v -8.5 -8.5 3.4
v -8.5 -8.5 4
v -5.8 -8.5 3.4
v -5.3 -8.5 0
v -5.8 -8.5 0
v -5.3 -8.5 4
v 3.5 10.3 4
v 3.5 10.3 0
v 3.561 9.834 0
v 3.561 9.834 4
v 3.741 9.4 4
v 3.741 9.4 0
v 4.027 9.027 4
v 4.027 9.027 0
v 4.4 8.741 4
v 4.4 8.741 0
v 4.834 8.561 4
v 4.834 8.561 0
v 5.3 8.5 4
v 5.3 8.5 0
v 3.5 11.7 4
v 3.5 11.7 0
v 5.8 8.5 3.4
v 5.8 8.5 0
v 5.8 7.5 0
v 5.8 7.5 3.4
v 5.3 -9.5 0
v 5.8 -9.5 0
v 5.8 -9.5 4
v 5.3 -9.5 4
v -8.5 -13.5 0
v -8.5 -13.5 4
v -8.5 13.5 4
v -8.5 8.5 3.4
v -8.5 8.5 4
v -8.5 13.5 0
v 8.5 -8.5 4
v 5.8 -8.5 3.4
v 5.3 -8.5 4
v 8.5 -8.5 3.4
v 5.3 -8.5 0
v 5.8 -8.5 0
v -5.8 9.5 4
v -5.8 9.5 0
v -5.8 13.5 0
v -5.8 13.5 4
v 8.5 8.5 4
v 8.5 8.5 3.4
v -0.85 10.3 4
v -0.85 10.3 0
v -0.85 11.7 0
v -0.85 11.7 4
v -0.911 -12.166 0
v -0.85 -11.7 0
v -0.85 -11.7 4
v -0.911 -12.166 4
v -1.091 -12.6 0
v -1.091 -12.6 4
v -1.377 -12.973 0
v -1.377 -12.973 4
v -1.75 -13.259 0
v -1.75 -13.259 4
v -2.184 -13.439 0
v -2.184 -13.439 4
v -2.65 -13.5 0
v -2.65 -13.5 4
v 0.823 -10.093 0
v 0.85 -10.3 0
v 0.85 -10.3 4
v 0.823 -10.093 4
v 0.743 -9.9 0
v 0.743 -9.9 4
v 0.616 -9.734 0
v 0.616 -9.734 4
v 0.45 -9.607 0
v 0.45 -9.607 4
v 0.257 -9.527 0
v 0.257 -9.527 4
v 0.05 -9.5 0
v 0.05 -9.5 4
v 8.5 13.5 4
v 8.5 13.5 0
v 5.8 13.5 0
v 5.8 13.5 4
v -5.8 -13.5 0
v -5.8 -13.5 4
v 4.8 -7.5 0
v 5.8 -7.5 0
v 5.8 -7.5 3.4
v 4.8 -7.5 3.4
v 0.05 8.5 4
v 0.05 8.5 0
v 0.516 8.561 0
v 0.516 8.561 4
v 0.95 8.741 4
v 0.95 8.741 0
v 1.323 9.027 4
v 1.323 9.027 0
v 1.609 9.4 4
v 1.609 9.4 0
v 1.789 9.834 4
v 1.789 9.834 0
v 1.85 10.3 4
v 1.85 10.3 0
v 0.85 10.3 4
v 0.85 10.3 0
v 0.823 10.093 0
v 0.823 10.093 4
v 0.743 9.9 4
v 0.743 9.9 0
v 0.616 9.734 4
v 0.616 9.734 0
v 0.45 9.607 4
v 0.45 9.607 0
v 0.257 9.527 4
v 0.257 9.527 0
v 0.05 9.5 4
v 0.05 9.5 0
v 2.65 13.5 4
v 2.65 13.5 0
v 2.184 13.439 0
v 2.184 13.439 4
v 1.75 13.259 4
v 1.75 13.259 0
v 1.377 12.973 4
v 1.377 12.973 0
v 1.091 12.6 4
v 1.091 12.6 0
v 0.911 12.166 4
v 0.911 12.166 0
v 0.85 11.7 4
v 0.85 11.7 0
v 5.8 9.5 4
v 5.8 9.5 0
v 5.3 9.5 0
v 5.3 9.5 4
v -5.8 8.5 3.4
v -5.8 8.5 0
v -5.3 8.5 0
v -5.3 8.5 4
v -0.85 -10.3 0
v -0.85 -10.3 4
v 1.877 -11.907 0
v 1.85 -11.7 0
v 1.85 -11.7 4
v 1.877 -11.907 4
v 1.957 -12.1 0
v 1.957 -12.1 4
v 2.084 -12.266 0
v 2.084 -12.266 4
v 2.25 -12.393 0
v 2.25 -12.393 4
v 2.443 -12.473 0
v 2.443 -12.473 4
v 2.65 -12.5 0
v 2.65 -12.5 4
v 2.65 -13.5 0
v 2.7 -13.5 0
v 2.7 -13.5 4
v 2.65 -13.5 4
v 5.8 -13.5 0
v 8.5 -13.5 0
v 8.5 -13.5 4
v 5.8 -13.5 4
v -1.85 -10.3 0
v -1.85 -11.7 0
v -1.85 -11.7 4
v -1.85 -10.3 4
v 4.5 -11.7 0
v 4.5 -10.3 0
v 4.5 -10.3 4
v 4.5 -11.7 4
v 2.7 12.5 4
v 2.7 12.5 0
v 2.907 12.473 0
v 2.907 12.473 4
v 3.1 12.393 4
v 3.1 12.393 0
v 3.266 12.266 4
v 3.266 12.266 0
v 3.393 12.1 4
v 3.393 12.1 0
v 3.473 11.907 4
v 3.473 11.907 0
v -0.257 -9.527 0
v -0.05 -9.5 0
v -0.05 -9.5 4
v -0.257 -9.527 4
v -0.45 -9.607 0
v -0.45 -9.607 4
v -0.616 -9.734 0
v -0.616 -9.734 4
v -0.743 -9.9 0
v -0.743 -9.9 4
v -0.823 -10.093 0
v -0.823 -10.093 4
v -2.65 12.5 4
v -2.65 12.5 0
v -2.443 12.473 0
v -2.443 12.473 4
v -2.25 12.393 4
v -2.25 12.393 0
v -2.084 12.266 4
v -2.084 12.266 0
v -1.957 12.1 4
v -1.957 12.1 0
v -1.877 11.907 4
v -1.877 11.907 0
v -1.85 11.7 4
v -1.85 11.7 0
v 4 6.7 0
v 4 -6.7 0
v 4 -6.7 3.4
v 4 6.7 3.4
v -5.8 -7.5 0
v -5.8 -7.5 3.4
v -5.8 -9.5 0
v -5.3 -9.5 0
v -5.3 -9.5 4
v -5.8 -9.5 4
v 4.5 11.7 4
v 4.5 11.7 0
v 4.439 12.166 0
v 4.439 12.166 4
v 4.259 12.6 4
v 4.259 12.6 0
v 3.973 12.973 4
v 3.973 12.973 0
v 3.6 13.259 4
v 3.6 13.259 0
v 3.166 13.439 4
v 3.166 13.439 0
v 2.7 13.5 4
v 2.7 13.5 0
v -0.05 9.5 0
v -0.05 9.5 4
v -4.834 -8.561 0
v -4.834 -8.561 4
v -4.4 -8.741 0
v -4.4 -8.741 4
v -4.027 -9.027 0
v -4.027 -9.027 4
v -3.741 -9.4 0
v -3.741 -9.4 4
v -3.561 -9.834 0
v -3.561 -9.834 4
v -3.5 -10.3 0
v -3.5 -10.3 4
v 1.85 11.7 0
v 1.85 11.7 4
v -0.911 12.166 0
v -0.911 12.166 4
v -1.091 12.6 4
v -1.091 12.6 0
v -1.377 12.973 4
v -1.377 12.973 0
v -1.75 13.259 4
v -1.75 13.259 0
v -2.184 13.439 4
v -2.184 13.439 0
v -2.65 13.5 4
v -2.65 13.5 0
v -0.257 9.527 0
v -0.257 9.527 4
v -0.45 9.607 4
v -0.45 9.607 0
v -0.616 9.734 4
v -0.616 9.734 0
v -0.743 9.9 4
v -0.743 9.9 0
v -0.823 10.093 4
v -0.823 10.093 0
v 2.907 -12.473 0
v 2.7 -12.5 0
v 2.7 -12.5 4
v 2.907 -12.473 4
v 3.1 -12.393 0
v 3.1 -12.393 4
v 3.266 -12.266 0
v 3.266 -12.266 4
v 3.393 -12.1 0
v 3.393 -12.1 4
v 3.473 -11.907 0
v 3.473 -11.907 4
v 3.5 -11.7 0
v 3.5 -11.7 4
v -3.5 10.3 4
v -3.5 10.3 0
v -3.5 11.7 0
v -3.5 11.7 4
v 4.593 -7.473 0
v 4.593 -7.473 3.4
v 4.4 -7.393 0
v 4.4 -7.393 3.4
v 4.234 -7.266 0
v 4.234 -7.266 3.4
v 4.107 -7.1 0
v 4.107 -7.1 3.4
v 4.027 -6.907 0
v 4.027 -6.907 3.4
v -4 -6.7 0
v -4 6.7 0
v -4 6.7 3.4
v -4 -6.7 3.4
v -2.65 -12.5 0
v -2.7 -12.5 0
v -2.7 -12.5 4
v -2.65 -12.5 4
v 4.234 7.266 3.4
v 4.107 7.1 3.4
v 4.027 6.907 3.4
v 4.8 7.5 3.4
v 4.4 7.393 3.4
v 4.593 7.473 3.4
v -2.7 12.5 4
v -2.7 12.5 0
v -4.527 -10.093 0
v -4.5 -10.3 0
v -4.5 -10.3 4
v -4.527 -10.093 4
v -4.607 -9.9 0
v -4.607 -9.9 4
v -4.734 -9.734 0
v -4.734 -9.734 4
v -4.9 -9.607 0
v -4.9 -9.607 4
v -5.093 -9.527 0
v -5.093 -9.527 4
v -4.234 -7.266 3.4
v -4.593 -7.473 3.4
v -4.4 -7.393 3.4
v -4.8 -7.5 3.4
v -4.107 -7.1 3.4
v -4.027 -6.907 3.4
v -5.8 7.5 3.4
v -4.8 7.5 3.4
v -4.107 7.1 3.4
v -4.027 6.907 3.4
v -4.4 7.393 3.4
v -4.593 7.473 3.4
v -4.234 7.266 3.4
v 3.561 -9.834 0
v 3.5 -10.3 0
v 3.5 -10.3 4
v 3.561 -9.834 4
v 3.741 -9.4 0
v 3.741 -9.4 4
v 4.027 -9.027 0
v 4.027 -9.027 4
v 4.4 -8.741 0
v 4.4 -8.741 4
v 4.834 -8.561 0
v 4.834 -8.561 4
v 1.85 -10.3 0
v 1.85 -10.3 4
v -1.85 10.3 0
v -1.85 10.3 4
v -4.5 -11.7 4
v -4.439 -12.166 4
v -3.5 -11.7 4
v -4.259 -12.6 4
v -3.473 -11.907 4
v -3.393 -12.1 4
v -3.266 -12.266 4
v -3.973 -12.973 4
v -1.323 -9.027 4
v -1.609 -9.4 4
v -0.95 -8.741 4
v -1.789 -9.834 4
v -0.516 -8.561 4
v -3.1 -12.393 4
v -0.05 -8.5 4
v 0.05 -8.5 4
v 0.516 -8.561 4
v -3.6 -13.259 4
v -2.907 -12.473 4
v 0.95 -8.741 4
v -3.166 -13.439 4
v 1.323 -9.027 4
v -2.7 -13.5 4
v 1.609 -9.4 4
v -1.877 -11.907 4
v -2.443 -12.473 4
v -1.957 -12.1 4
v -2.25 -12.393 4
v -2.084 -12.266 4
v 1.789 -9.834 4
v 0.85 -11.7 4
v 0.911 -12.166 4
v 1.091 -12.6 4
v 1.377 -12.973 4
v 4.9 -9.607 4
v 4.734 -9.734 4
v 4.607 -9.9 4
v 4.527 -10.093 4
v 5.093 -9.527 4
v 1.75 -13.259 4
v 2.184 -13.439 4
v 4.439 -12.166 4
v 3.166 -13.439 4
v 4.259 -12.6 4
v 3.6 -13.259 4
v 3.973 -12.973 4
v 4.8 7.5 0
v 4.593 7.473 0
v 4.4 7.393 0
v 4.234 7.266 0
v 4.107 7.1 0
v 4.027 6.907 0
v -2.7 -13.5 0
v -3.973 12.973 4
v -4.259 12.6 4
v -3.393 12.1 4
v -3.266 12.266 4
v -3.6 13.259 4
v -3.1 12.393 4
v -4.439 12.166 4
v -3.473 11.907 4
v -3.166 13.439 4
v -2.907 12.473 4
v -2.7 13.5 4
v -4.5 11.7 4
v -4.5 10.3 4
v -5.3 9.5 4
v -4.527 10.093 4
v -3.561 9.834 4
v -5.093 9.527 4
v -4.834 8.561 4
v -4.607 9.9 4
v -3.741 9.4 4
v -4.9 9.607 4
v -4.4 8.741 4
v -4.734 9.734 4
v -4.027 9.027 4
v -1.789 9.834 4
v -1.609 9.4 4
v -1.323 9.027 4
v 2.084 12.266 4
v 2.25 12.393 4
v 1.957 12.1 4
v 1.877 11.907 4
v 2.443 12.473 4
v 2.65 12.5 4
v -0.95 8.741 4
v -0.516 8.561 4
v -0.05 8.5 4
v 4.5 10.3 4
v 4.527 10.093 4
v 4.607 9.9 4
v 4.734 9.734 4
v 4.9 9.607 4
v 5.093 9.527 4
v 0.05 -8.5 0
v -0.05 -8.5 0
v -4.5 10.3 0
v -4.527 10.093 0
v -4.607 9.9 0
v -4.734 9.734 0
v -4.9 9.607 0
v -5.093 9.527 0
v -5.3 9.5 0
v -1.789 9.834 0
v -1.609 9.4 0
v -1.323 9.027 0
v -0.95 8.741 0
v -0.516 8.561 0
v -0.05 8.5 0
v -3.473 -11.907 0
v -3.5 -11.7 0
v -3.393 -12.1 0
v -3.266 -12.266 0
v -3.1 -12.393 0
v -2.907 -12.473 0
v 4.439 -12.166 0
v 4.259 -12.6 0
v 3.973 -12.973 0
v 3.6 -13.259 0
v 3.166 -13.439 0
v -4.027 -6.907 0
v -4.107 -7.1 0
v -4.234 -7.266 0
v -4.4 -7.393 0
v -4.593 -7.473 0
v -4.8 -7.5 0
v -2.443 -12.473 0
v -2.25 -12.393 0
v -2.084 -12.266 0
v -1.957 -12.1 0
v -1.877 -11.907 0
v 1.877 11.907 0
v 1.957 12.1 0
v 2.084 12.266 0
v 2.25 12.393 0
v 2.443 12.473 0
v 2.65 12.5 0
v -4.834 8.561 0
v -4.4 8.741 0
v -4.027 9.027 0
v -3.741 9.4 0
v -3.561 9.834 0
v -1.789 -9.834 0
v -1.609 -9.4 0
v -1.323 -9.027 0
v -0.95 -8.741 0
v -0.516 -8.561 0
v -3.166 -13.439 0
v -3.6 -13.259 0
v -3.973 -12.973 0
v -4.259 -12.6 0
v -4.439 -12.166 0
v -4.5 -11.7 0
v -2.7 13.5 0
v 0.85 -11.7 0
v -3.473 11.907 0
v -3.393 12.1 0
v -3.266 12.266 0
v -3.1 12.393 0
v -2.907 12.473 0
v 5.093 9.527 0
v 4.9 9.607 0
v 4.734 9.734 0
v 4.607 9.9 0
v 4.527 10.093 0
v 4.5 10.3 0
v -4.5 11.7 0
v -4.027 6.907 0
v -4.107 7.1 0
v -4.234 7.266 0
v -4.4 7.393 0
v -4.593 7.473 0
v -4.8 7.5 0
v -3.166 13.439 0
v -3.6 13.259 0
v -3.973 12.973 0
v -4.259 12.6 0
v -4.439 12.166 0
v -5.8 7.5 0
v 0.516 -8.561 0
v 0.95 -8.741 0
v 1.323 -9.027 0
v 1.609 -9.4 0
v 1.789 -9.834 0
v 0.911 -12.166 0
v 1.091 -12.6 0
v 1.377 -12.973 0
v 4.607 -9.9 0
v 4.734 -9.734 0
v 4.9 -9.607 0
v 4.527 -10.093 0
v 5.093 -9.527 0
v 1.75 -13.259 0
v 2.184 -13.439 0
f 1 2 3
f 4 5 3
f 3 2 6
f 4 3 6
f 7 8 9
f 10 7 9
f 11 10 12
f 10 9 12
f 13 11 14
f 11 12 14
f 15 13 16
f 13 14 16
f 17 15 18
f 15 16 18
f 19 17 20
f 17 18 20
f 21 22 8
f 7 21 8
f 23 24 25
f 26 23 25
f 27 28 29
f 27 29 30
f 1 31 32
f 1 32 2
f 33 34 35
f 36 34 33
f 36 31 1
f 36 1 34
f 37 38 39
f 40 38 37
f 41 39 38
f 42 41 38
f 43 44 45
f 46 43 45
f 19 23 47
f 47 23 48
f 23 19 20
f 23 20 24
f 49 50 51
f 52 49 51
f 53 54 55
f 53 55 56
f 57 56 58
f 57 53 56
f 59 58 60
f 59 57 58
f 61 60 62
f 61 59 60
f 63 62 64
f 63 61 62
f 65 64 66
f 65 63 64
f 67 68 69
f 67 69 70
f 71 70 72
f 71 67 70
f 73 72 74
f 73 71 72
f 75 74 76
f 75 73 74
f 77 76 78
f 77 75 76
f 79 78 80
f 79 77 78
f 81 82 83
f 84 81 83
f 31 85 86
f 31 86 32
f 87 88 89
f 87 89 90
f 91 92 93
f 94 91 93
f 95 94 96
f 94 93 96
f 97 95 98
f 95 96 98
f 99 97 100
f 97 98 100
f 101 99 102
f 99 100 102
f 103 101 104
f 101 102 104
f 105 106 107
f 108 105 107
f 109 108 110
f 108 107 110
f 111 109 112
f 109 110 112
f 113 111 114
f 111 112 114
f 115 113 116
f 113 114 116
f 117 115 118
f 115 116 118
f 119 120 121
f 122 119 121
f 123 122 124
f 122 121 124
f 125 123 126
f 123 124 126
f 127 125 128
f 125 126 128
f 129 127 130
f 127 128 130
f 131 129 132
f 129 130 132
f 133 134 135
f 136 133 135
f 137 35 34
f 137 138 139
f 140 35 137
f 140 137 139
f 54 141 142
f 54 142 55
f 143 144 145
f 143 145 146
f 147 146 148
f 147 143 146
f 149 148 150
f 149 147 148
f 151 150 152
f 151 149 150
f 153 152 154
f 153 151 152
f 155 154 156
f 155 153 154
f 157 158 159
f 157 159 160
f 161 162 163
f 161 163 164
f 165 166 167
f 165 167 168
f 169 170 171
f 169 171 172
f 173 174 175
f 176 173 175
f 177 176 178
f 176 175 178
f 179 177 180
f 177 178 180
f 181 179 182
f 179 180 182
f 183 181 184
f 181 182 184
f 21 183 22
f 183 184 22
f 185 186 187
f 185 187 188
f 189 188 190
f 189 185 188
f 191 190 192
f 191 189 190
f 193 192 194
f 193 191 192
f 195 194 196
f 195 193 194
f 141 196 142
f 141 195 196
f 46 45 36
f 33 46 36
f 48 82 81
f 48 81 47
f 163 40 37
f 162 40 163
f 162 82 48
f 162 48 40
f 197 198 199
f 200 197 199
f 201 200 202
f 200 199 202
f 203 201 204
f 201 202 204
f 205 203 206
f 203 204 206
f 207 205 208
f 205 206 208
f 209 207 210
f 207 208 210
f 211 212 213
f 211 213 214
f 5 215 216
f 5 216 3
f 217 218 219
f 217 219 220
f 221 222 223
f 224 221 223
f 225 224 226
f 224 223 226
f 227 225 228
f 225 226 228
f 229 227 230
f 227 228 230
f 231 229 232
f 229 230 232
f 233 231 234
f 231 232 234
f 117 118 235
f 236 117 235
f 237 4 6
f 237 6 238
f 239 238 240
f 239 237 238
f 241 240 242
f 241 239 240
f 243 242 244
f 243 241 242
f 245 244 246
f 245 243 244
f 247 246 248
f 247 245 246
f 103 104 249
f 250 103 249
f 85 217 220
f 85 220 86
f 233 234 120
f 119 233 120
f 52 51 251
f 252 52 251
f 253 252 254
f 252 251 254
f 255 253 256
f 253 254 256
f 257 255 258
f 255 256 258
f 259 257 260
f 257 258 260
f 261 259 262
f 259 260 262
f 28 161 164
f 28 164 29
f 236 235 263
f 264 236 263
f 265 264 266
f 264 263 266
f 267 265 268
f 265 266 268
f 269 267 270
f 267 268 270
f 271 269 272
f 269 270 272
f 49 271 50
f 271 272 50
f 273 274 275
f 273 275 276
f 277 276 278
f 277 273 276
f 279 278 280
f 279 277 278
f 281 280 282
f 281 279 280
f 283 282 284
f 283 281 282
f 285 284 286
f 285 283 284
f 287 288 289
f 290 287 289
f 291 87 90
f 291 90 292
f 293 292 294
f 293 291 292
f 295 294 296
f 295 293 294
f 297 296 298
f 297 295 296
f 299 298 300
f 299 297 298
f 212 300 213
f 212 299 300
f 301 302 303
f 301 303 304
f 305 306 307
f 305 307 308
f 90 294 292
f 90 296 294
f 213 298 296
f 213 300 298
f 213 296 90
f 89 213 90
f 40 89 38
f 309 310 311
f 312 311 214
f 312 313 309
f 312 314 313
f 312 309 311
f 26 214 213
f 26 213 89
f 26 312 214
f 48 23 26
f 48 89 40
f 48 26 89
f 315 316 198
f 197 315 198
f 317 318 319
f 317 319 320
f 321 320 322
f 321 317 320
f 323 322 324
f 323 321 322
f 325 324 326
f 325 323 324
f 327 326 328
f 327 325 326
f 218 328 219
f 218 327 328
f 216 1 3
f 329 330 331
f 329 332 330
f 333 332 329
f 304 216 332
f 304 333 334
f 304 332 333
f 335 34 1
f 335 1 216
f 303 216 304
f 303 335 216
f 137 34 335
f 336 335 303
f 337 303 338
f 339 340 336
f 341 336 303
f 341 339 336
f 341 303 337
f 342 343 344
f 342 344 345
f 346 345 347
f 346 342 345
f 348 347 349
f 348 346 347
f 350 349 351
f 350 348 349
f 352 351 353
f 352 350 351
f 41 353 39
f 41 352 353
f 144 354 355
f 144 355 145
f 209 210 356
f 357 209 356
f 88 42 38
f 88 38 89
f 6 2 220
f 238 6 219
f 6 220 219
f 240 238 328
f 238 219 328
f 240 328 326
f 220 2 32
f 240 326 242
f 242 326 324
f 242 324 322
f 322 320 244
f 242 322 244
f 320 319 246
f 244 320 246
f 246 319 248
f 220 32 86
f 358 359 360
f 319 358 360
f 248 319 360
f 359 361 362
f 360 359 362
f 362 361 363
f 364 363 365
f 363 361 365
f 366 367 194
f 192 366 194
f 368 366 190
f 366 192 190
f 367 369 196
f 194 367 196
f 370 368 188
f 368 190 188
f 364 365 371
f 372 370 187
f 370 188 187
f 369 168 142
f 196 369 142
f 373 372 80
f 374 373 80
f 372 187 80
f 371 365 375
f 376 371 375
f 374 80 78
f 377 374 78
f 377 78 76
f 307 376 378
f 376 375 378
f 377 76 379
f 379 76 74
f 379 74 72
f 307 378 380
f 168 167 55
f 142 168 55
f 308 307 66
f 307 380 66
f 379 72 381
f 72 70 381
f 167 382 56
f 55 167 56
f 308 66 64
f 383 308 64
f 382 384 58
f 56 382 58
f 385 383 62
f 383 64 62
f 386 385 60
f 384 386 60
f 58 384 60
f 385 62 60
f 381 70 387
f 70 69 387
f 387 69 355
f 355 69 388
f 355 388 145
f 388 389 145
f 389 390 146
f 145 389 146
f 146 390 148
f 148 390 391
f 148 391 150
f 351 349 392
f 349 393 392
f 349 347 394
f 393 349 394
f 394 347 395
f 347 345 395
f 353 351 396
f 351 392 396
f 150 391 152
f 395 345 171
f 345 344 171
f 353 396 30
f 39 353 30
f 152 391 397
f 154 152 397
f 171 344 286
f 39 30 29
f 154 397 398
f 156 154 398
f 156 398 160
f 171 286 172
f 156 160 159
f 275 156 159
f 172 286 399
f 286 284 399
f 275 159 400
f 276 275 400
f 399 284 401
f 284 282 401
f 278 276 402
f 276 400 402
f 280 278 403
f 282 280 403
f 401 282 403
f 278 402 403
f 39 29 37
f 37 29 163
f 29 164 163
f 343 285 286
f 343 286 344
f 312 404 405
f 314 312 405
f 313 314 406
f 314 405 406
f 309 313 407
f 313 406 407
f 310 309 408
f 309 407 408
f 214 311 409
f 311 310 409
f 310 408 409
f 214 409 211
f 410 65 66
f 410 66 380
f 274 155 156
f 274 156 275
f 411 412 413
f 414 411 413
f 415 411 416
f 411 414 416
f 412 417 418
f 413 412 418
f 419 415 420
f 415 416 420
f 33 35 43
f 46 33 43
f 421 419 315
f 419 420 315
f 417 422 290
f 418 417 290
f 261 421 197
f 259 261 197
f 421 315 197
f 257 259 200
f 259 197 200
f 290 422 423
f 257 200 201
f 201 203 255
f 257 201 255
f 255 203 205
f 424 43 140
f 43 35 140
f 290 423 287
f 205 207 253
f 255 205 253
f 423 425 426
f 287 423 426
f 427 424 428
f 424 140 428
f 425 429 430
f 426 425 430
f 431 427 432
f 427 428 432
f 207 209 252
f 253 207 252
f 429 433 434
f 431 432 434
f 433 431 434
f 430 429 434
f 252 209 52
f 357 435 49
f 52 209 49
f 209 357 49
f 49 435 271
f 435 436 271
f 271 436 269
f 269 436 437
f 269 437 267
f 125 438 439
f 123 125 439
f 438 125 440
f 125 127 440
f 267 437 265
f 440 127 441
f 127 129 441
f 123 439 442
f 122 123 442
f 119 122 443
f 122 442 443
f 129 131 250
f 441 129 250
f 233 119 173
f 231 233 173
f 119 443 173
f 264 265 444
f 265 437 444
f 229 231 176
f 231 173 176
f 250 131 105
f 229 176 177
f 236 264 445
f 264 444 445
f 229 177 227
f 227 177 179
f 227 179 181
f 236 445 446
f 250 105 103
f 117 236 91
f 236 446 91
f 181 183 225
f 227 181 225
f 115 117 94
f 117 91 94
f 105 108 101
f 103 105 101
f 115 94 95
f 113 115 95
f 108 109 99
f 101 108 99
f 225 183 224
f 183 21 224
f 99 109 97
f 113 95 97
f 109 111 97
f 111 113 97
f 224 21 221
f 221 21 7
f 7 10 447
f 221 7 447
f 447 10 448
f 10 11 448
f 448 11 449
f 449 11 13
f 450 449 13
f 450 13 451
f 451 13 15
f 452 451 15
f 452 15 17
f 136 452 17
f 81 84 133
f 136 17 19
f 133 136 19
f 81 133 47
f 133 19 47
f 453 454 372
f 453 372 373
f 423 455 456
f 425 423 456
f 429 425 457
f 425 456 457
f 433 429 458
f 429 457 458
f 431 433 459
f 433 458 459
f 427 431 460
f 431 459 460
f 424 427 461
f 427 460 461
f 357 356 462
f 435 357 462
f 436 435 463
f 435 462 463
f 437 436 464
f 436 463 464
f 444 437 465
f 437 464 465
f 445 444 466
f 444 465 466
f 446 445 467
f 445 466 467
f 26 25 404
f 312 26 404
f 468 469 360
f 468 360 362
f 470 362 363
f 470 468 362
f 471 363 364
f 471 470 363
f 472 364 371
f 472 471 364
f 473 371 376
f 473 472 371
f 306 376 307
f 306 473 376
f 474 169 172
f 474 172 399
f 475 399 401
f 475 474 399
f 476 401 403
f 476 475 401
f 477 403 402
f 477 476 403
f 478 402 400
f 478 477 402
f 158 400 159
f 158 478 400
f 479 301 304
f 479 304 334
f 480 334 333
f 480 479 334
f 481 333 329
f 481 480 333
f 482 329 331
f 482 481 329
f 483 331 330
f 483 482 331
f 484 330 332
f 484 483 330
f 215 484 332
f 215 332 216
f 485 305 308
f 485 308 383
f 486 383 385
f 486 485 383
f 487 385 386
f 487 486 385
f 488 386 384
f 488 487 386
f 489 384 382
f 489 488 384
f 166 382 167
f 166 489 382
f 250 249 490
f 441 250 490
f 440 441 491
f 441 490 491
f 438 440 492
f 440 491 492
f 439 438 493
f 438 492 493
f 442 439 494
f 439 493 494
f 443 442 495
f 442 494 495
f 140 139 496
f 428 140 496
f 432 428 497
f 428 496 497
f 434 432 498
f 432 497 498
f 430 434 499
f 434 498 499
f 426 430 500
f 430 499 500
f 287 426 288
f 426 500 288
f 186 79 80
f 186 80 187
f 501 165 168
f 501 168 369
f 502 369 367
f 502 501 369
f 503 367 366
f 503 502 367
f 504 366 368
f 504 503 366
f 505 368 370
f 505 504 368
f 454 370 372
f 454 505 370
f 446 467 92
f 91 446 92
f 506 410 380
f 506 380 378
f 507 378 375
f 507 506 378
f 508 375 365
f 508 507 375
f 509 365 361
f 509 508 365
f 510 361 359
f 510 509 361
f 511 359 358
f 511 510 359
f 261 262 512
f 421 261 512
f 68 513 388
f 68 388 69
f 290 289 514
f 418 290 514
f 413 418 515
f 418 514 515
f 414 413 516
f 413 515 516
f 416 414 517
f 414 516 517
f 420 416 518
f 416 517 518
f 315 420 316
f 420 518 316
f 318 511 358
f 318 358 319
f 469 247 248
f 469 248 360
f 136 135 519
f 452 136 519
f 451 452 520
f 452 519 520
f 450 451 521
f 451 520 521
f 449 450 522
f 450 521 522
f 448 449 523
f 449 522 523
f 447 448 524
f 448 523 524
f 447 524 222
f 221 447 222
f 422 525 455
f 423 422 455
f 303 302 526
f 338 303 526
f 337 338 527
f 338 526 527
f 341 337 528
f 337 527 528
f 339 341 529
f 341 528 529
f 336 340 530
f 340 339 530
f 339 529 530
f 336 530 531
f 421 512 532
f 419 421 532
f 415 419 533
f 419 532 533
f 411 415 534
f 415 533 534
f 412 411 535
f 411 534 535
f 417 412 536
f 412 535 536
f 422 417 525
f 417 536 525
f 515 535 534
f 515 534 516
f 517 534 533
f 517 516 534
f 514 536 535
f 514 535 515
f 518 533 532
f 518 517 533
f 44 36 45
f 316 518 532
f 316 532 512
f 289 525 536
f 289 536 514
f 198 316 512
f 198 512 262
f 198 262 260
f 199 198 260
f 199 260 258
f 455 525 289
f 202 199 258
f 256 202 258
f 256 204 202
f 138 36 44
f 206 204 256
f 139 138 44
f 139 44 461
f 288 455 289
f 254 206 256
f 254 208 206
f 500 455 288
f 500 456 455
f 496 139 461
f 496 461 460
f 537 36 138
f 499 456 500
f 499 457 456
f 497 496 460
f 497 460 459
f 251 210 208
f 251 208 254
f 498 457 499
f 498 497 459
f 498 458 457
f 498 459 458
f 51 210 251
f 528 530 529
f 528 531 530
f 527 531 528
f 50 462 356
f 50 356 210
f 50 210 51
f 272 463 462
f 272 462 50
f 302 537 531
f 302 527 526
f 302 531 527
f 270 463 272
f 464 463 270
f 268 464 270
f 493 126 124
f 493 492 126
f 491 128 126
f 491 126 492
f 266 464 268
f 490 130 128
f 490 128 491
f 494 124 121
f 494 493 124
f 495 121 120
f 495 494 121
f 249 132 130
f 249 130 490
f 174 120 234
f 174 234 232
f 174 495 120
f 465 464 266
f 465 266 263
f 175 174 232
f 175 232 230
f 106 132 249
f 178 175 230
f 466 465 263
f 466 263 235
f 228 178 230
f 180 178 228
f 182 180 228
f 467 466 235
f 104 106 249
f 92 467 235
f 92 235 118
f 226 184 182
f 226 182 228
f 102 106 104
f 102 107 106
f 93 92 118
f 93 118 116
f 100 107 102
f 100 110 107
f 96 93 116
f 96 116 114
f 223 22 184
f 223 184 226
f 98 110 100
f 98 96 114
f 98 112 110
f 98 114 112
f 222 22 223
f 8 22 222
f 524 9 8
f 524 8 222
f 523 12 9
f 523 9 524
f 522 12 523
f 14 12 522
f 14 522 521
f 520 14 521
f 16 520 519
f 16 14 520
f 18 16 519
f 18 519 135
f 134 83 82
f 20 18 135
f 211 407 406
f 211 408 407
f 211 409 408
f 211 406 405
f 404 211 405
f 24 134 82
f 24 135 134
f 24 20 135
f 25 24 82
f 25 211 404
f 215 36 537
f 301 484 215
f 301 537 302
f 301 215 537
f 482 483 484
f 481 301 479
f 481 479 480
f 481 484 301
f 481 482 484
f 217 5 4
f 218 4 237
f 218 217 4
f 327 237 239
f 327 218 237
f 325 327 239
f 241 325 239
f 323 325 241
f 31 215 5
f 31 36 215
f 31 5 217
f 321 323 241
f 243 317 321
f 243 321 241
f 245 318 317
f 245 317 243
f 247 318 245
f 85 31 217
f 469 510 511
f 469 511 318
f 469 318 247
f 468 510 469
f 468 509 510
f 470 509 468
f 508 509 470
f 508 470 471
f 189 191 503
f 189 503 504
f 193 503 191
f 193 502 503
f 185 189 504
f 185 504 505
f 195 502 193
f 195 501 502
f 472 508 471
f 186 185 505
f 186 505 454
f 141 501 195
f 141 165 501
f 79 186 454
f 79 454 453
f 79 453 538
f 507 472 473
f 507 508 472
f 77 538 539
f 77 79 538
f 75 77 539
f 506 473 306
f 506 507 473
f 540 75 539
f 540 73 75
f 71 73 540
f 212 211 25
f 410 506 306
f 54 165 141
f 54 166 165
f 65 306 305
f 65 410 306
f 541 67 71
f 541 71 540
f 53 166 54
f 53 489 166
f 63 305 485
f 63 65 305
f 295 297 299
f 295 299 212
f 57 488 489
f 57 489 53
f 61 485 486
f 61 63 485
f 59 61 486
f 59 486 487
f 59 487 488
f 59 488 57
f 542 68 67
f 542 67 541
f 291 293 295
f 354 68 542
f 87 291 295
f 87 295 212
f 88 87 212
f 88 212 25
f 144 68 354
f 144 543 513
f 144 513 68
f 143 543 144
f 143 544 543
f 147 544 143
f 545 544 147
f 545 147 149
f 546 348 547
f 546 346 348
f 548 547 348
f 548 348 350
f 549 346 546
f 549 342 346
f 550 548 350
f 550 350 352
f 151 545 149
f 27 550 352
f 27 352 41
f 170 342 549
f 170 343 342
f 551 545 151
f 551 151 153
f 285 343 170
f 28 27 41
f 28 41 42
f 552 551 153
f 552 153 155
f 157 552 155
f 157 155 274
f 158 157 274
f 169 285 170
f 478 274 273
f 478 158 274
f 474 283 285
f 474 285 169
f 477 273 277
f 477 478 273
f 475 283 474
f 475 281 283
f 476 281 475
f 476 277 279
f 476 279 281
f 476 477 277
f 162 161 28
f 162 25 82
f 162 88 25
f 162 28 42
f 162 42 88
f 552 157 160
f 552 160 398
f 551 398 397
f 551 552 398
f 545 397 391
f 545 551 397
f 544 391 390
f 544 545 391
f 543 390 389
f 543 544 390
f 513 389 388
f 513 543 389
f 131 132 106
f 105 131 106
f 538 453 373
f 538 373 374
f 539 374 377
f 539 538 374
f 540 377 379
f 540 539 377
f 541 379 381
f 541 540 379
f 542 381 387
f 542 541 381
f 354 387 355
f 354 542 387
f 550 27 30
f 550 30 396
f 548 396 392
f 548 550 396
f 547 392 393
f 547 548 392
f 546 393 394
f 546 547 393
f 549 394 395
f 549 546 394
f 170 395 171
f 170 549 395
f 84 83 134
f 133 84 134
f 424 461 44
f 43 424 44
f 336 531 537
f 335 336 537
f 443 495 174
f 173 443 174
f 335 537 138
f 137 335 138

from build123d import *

# Parameters (mm, degrees)
F1_DEPTH = 4
F3_W     = 17
F3_H     = 17
F4_DEPTH = 0.6


with BuildPart() as f1:
    # F0 (on Top) → F1 (new body)
    with BuildSketch(Plane.XY):
        with BuildLine():
            Line((-8.5, 0), (-4, 0))
            Line((-4, 0), (-4, 6.7))
            ThreePointArc((-4, 6.7), (-4.234315, 7.265685), (-4.8, 7.5))
            Line((-4.8, 7.5), (-5.8, 7.5))
            Line((-5.8, 7.5), (-5.8, 8.5))
            Line((-5.8, 8.5), (-5.3, 8.5))
            ThreePointArc((-5.3, 8.5), (-4.027208, 9.027208), (-3.5, 10.3))
            Line((-3.5, 10.3), (-3.5, 11.7))
            ThreePointArc((-3.5, 11.7), (-3.265685, 12.265685), (-2.7, 12.5))
            Line((-2.7, 12.5), (-2.65, 12.5))
            ThreePointArc((-2.65, 12.5), (-2.084315, 12.265685), (-1.85, 11.7))
            Line((-1.85, 11.7), (-1.85, 10.3))
            ThreePointArc((-1.85, 10.3), (-1.322792, 9.027208), (-0.05, 8.5))
            Line((-0.05, 8.5), (0.05, 8.5))
            ThreePointArc((0.05, 8.5), (1.322792, 9.027208), (1.85, 10.3))
            Line((1.85, 10.3), (1.85, 11.7))
            ThreePointArc((1.85, 11.7), (2.084315, 12.265685), (2.65, 12.5))
            Line((2.65, 12.5), (2.7, 12.5))
            ThreePointArc((2.7, 12.5), (3.265685, 12.265685), (3.5, 11.7))
            Line((3.5, 11.7), (3.5, 10.3))
            ThreePointArc((3.5, 10.3), (4.027208, 9.027208), (5.3, 8.5))
            Line((5.3, 8.5), (5.8, 8.5))
            Line((5.8, 8.5), (5.8, 7.5))
            Line((5.8, 7.5), (4.8, 7.5))
            ThreePointArc((4.8, 7.5), (4.234315, 7.265685), (4, 6.7))
            Line((4, 6.7), (4, 0))
            Line((4, 0), (8.5, 0))
            Line((8.5, 0), (8.5, 13.5))
            Line((8.5, 13.5), (5.8, 13.5))
            Line((5.8, 13.5), (5.8, 9.5))
            Line((5.8, 9.5), (5.3, 9.5))
            ThreePointArc((5.3, 9.5), (4.734315, 9.734315), (4.5, 10.3))
            Line((4.5, 10.3), (4.5, 11.7))
            ThreePointArc((4.5, 11.7), (3.972792, 12.972792), (2.7, 13.5))
            Line((2.7, 13.5), (2.65, 13.5))
            ThreePointArc((2.65, 13.5), (1.377208, 12.972792), (0.85, 11.7))
            Line((0.85, 11.7), (0.85, 10.3))
            ThreePointArc((0.85, 10.3), (0.615685, 9.734315), (0.05, 9.5))
            Line((0.05, 9.5), (-0.05, 9.5))
            ThreePointArc((-0.05, 9.5), (-0.615685, 9.734315), (-0.85, 10.3))
            Line((-0.85, 10.3), (-0.85, 11.7))
            ThreePointArc((-0.85, 11.7), (-1.377208, 12.972792), (-2.65, 13.5))
            Line((-2.65, 13.5), (-2.7, 13.5))
            ThreePointArc((-2.7, 13.5), (-3.972792, 12.972792), (-4.5, 11.7))
            Line((-4.5, 11.7), (-4.5, 10.3))
            ThreePointArc((-4.5, 10.3), (-4.734315, 9.734315), (-5.3, 9.5))
            Line((-5.3, 9.5), (-5.8, 9.5))
            Line((-5.8, 9.5), (-5.8, 13.5))
            Line((-5.8, 13.5), (-8.5, 13.5))
            Line((-8.5, 13.5), (-8.5, 0))
        make_face()
    extrude(amount=F1_DEPTH)

    # F2: F1 across plane


with BuildPart() as f1_1:
    add(f1.part)
    add(f1.part.mirror(Plane.XZ))

    # F3 (on face) → F4 (cut)
    with BuildSketch(Plane.XY.offset(4)):
        Rectangle(F3_W, F3_H)
    extrude(amount=-F4_DEPTH, mode=Mode.SUBTRACT)


solid = f1_1.part
